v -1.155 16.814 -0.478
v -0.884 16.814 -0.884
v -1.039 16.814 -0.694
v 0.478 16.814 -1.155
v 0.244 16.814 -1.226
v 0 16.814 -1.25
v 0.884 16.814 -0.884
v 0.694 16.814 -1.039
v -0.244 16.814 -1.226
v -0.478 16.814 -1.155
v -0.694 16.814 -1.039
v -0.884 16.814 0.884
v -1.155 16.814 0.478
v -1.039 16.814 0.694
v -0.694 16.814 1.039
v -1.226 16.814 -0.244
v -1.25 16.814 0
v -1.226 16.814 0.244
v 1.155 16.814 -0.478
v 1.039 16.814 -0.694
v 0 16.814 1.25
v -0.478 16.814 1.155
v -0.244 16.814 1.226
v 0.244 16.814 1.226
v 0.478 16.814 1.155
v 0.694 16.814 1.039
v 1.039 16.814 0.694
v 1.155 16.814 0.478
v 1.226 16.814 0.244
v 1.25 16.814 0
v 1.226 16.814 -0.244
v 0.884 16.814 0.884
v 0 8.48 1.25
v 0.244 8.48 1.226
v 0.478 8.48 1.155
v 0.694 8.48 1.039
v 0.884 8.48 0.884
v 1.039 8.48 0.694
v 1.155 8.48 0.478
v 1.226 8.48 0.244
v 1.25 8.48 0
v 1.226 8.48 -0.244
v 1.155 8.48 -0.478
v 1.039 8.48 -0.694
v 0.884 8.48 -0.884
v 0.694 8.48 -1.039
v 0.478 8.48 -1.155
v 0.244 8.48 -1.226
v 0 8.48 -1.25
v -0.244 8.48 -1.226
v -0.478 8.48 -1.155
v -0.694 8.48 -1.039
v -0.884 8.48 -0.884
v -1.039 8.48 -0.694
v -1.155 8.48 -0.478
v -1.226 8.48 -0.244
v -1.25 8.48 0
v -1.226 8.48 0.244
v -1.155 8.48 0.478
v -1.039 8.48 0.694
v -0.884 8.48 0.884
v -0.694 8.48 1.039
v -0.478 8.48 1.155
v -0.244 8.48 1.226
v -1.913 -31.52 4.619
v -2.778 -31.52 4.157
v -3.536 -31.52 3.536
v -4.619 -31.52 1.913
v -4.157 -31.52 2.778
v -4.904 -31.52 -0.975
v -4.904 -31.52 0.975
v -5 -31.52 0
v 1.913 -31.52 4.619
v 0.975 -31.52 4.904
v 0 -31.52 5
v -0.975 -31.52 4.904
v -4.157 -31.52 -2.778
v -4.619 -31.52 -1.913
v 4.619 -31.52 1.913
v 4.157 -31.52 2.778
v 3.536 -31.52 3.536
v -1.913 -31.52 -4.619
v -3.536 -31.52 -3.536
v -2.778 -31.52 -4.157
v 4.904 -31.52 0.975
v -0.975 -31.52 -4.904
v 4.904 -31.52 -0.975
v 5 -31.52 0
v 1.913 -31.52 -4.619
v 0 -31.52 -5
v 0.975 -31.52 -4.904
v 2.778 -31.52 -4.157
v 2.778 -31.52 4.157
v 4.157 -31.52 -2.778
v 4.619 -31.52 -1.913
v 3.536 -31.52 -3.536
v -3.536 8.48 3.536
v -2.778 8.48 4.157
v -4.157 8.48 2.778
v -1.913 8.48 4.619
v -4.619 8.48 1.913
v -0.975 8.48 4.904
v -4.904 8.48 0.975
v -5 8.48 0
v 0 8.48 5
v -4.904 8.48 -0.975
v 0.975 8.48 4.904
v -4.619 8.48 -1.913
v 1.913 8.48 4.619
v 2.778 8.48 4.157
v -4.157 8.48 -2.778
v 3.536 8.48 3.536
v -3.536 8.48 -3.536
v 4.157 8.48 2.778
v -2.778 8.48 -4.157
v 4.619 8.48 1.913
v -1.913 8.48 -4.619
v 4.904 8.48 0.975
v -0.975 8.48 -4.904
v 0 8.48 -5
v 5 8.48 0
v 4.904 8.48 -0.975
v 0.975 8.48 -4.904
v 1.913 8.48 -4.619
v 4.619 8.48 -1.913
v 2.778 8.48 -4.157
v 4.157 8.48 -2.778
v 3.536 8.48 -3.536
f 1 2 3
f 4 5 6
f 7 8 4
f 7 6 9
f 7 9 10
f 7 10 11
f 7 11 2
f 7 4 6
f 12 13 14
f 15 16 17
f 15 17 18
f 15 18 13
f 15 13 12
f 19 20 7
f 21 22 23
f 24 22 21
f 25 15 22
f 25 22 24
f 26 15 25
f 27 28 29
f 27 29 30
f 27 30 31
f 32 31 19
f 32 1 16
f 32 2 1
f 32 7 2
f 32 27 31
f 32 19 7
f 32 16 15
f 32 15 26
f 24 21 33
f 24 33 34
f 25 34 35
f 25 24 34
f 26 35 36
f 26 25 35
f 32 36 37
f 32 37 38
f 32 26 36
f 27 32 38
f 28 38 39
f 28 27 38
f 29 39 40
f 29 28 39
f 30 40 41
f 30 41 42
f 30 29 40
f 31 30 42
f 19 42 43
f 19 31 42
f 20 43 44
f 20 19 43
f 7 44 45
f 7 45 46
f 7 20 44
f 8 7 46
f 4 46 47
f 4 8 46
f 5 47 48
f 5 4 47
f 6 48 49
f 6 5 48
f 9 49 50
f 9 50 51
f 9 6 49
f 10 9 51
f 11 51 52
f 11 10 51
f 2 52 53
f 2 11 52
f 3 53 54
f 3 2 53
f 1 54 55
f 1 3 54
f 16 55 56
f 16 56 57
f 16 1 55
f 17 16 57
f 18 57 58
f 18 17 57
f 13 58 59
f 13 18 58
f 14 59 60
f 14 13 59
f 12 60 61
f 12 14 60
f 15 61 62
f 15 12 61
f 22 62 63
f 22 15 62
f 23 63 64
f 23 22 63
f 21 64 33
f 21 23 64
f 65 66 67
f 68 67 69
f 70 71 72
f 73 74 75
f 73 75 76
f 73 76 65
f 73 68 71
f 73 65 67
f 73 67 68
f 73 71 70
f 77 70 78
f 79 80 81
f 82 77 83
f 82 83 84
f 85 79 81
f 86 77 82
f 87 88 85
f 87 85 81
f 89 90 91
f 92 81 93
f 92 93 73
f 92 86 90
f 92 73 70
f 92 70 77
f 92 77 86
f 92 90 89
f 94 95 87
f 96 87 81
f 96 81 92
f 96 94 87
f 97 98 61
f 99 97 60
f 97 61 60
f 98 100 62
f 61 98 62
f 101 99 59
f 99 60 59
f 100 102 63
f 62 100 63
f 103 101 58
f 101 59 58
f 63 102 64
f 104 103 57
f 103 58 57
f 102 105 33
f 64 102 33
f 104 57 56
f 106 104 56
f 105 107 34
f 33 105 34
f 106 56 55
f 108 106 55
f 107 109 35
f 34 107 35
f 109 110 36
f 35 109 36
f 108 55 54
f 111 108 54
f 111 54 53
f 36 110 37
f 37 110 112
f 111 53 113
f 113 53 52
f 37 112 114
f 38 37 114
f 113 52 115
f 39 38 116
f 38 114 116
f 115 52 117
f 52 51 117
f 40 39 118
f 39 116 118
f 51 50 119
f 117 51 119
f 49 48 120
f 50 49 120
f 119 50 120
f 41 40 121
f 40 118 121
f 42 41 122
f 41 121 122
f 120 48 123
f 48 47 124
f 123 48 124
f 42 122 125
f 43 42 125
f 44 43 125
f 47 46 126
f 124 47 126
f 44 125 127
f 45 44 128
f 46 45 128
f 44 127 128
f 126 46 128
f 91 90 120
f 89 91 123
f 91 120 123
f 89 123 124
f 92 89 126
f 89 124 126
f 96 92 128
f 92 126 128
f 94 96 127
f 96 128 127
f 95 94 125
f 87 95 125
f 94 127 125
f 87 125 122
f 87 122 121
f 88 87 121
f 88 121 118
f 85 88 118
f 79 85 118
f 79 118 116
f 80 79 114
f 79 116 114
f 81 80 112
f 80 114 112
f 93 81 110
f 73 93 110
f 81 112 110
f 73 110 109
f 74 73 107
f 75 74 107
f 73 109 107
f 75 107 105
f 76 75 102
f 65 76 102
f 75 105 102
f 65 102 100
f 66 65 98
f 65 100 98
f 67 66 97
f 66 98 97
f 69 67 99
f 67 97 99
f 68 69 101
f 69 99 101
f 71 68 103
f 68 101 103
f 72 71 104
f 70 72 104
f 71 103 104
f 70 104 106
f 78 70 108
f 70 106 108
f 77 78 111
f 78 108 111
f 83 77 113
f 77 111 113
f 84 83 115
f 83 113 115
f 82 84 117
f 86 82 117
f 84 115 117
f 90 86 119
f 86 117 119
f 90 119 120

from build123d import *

# Parameters (mm, degrees)
SKETCH1_R           = 0.5
BOSS_EXTRUDE1_DEPTH = 3.333333
SKETCH2_R           = 2
BOSS_EXTRUDE2_DEPTH = 16
SCALE1_SCALE        = 2.5


with BuildPart() as part:
    # Sketch1 → Boss-Extrude1 (new body)
    with BuildSketch(Plane(origin=(0, 0, 0), x_dir=(1, 0, 0), z_dir=(0, 1, 0))):
        with Locations(Location((0, 0, 0), (0, 0, 270))):
            Circle(SKETCH1_R)
    extrude(amount=-BOSS_EXTRUDE1_DEPTH)

    # Sketch2 → Boss-Extrude2 (add)
    with BuildSketch(Plane.XZ.offset(3.333333)):
        with Locations(Location((0, 0, 0), (0, 0, 270))):
            Circle(SKETCH2_R)
    extrude(amount=BOSS_EXTRUDE2_DEPTH)


with BuildPart() as part_1:
    # Scale1: scaled about (0, -11.2090828, 0)
    add(part.part.scale(SCALE1_SCALE).moved(Location((0, 16.8136242, 0))))


solid = part_1.part
